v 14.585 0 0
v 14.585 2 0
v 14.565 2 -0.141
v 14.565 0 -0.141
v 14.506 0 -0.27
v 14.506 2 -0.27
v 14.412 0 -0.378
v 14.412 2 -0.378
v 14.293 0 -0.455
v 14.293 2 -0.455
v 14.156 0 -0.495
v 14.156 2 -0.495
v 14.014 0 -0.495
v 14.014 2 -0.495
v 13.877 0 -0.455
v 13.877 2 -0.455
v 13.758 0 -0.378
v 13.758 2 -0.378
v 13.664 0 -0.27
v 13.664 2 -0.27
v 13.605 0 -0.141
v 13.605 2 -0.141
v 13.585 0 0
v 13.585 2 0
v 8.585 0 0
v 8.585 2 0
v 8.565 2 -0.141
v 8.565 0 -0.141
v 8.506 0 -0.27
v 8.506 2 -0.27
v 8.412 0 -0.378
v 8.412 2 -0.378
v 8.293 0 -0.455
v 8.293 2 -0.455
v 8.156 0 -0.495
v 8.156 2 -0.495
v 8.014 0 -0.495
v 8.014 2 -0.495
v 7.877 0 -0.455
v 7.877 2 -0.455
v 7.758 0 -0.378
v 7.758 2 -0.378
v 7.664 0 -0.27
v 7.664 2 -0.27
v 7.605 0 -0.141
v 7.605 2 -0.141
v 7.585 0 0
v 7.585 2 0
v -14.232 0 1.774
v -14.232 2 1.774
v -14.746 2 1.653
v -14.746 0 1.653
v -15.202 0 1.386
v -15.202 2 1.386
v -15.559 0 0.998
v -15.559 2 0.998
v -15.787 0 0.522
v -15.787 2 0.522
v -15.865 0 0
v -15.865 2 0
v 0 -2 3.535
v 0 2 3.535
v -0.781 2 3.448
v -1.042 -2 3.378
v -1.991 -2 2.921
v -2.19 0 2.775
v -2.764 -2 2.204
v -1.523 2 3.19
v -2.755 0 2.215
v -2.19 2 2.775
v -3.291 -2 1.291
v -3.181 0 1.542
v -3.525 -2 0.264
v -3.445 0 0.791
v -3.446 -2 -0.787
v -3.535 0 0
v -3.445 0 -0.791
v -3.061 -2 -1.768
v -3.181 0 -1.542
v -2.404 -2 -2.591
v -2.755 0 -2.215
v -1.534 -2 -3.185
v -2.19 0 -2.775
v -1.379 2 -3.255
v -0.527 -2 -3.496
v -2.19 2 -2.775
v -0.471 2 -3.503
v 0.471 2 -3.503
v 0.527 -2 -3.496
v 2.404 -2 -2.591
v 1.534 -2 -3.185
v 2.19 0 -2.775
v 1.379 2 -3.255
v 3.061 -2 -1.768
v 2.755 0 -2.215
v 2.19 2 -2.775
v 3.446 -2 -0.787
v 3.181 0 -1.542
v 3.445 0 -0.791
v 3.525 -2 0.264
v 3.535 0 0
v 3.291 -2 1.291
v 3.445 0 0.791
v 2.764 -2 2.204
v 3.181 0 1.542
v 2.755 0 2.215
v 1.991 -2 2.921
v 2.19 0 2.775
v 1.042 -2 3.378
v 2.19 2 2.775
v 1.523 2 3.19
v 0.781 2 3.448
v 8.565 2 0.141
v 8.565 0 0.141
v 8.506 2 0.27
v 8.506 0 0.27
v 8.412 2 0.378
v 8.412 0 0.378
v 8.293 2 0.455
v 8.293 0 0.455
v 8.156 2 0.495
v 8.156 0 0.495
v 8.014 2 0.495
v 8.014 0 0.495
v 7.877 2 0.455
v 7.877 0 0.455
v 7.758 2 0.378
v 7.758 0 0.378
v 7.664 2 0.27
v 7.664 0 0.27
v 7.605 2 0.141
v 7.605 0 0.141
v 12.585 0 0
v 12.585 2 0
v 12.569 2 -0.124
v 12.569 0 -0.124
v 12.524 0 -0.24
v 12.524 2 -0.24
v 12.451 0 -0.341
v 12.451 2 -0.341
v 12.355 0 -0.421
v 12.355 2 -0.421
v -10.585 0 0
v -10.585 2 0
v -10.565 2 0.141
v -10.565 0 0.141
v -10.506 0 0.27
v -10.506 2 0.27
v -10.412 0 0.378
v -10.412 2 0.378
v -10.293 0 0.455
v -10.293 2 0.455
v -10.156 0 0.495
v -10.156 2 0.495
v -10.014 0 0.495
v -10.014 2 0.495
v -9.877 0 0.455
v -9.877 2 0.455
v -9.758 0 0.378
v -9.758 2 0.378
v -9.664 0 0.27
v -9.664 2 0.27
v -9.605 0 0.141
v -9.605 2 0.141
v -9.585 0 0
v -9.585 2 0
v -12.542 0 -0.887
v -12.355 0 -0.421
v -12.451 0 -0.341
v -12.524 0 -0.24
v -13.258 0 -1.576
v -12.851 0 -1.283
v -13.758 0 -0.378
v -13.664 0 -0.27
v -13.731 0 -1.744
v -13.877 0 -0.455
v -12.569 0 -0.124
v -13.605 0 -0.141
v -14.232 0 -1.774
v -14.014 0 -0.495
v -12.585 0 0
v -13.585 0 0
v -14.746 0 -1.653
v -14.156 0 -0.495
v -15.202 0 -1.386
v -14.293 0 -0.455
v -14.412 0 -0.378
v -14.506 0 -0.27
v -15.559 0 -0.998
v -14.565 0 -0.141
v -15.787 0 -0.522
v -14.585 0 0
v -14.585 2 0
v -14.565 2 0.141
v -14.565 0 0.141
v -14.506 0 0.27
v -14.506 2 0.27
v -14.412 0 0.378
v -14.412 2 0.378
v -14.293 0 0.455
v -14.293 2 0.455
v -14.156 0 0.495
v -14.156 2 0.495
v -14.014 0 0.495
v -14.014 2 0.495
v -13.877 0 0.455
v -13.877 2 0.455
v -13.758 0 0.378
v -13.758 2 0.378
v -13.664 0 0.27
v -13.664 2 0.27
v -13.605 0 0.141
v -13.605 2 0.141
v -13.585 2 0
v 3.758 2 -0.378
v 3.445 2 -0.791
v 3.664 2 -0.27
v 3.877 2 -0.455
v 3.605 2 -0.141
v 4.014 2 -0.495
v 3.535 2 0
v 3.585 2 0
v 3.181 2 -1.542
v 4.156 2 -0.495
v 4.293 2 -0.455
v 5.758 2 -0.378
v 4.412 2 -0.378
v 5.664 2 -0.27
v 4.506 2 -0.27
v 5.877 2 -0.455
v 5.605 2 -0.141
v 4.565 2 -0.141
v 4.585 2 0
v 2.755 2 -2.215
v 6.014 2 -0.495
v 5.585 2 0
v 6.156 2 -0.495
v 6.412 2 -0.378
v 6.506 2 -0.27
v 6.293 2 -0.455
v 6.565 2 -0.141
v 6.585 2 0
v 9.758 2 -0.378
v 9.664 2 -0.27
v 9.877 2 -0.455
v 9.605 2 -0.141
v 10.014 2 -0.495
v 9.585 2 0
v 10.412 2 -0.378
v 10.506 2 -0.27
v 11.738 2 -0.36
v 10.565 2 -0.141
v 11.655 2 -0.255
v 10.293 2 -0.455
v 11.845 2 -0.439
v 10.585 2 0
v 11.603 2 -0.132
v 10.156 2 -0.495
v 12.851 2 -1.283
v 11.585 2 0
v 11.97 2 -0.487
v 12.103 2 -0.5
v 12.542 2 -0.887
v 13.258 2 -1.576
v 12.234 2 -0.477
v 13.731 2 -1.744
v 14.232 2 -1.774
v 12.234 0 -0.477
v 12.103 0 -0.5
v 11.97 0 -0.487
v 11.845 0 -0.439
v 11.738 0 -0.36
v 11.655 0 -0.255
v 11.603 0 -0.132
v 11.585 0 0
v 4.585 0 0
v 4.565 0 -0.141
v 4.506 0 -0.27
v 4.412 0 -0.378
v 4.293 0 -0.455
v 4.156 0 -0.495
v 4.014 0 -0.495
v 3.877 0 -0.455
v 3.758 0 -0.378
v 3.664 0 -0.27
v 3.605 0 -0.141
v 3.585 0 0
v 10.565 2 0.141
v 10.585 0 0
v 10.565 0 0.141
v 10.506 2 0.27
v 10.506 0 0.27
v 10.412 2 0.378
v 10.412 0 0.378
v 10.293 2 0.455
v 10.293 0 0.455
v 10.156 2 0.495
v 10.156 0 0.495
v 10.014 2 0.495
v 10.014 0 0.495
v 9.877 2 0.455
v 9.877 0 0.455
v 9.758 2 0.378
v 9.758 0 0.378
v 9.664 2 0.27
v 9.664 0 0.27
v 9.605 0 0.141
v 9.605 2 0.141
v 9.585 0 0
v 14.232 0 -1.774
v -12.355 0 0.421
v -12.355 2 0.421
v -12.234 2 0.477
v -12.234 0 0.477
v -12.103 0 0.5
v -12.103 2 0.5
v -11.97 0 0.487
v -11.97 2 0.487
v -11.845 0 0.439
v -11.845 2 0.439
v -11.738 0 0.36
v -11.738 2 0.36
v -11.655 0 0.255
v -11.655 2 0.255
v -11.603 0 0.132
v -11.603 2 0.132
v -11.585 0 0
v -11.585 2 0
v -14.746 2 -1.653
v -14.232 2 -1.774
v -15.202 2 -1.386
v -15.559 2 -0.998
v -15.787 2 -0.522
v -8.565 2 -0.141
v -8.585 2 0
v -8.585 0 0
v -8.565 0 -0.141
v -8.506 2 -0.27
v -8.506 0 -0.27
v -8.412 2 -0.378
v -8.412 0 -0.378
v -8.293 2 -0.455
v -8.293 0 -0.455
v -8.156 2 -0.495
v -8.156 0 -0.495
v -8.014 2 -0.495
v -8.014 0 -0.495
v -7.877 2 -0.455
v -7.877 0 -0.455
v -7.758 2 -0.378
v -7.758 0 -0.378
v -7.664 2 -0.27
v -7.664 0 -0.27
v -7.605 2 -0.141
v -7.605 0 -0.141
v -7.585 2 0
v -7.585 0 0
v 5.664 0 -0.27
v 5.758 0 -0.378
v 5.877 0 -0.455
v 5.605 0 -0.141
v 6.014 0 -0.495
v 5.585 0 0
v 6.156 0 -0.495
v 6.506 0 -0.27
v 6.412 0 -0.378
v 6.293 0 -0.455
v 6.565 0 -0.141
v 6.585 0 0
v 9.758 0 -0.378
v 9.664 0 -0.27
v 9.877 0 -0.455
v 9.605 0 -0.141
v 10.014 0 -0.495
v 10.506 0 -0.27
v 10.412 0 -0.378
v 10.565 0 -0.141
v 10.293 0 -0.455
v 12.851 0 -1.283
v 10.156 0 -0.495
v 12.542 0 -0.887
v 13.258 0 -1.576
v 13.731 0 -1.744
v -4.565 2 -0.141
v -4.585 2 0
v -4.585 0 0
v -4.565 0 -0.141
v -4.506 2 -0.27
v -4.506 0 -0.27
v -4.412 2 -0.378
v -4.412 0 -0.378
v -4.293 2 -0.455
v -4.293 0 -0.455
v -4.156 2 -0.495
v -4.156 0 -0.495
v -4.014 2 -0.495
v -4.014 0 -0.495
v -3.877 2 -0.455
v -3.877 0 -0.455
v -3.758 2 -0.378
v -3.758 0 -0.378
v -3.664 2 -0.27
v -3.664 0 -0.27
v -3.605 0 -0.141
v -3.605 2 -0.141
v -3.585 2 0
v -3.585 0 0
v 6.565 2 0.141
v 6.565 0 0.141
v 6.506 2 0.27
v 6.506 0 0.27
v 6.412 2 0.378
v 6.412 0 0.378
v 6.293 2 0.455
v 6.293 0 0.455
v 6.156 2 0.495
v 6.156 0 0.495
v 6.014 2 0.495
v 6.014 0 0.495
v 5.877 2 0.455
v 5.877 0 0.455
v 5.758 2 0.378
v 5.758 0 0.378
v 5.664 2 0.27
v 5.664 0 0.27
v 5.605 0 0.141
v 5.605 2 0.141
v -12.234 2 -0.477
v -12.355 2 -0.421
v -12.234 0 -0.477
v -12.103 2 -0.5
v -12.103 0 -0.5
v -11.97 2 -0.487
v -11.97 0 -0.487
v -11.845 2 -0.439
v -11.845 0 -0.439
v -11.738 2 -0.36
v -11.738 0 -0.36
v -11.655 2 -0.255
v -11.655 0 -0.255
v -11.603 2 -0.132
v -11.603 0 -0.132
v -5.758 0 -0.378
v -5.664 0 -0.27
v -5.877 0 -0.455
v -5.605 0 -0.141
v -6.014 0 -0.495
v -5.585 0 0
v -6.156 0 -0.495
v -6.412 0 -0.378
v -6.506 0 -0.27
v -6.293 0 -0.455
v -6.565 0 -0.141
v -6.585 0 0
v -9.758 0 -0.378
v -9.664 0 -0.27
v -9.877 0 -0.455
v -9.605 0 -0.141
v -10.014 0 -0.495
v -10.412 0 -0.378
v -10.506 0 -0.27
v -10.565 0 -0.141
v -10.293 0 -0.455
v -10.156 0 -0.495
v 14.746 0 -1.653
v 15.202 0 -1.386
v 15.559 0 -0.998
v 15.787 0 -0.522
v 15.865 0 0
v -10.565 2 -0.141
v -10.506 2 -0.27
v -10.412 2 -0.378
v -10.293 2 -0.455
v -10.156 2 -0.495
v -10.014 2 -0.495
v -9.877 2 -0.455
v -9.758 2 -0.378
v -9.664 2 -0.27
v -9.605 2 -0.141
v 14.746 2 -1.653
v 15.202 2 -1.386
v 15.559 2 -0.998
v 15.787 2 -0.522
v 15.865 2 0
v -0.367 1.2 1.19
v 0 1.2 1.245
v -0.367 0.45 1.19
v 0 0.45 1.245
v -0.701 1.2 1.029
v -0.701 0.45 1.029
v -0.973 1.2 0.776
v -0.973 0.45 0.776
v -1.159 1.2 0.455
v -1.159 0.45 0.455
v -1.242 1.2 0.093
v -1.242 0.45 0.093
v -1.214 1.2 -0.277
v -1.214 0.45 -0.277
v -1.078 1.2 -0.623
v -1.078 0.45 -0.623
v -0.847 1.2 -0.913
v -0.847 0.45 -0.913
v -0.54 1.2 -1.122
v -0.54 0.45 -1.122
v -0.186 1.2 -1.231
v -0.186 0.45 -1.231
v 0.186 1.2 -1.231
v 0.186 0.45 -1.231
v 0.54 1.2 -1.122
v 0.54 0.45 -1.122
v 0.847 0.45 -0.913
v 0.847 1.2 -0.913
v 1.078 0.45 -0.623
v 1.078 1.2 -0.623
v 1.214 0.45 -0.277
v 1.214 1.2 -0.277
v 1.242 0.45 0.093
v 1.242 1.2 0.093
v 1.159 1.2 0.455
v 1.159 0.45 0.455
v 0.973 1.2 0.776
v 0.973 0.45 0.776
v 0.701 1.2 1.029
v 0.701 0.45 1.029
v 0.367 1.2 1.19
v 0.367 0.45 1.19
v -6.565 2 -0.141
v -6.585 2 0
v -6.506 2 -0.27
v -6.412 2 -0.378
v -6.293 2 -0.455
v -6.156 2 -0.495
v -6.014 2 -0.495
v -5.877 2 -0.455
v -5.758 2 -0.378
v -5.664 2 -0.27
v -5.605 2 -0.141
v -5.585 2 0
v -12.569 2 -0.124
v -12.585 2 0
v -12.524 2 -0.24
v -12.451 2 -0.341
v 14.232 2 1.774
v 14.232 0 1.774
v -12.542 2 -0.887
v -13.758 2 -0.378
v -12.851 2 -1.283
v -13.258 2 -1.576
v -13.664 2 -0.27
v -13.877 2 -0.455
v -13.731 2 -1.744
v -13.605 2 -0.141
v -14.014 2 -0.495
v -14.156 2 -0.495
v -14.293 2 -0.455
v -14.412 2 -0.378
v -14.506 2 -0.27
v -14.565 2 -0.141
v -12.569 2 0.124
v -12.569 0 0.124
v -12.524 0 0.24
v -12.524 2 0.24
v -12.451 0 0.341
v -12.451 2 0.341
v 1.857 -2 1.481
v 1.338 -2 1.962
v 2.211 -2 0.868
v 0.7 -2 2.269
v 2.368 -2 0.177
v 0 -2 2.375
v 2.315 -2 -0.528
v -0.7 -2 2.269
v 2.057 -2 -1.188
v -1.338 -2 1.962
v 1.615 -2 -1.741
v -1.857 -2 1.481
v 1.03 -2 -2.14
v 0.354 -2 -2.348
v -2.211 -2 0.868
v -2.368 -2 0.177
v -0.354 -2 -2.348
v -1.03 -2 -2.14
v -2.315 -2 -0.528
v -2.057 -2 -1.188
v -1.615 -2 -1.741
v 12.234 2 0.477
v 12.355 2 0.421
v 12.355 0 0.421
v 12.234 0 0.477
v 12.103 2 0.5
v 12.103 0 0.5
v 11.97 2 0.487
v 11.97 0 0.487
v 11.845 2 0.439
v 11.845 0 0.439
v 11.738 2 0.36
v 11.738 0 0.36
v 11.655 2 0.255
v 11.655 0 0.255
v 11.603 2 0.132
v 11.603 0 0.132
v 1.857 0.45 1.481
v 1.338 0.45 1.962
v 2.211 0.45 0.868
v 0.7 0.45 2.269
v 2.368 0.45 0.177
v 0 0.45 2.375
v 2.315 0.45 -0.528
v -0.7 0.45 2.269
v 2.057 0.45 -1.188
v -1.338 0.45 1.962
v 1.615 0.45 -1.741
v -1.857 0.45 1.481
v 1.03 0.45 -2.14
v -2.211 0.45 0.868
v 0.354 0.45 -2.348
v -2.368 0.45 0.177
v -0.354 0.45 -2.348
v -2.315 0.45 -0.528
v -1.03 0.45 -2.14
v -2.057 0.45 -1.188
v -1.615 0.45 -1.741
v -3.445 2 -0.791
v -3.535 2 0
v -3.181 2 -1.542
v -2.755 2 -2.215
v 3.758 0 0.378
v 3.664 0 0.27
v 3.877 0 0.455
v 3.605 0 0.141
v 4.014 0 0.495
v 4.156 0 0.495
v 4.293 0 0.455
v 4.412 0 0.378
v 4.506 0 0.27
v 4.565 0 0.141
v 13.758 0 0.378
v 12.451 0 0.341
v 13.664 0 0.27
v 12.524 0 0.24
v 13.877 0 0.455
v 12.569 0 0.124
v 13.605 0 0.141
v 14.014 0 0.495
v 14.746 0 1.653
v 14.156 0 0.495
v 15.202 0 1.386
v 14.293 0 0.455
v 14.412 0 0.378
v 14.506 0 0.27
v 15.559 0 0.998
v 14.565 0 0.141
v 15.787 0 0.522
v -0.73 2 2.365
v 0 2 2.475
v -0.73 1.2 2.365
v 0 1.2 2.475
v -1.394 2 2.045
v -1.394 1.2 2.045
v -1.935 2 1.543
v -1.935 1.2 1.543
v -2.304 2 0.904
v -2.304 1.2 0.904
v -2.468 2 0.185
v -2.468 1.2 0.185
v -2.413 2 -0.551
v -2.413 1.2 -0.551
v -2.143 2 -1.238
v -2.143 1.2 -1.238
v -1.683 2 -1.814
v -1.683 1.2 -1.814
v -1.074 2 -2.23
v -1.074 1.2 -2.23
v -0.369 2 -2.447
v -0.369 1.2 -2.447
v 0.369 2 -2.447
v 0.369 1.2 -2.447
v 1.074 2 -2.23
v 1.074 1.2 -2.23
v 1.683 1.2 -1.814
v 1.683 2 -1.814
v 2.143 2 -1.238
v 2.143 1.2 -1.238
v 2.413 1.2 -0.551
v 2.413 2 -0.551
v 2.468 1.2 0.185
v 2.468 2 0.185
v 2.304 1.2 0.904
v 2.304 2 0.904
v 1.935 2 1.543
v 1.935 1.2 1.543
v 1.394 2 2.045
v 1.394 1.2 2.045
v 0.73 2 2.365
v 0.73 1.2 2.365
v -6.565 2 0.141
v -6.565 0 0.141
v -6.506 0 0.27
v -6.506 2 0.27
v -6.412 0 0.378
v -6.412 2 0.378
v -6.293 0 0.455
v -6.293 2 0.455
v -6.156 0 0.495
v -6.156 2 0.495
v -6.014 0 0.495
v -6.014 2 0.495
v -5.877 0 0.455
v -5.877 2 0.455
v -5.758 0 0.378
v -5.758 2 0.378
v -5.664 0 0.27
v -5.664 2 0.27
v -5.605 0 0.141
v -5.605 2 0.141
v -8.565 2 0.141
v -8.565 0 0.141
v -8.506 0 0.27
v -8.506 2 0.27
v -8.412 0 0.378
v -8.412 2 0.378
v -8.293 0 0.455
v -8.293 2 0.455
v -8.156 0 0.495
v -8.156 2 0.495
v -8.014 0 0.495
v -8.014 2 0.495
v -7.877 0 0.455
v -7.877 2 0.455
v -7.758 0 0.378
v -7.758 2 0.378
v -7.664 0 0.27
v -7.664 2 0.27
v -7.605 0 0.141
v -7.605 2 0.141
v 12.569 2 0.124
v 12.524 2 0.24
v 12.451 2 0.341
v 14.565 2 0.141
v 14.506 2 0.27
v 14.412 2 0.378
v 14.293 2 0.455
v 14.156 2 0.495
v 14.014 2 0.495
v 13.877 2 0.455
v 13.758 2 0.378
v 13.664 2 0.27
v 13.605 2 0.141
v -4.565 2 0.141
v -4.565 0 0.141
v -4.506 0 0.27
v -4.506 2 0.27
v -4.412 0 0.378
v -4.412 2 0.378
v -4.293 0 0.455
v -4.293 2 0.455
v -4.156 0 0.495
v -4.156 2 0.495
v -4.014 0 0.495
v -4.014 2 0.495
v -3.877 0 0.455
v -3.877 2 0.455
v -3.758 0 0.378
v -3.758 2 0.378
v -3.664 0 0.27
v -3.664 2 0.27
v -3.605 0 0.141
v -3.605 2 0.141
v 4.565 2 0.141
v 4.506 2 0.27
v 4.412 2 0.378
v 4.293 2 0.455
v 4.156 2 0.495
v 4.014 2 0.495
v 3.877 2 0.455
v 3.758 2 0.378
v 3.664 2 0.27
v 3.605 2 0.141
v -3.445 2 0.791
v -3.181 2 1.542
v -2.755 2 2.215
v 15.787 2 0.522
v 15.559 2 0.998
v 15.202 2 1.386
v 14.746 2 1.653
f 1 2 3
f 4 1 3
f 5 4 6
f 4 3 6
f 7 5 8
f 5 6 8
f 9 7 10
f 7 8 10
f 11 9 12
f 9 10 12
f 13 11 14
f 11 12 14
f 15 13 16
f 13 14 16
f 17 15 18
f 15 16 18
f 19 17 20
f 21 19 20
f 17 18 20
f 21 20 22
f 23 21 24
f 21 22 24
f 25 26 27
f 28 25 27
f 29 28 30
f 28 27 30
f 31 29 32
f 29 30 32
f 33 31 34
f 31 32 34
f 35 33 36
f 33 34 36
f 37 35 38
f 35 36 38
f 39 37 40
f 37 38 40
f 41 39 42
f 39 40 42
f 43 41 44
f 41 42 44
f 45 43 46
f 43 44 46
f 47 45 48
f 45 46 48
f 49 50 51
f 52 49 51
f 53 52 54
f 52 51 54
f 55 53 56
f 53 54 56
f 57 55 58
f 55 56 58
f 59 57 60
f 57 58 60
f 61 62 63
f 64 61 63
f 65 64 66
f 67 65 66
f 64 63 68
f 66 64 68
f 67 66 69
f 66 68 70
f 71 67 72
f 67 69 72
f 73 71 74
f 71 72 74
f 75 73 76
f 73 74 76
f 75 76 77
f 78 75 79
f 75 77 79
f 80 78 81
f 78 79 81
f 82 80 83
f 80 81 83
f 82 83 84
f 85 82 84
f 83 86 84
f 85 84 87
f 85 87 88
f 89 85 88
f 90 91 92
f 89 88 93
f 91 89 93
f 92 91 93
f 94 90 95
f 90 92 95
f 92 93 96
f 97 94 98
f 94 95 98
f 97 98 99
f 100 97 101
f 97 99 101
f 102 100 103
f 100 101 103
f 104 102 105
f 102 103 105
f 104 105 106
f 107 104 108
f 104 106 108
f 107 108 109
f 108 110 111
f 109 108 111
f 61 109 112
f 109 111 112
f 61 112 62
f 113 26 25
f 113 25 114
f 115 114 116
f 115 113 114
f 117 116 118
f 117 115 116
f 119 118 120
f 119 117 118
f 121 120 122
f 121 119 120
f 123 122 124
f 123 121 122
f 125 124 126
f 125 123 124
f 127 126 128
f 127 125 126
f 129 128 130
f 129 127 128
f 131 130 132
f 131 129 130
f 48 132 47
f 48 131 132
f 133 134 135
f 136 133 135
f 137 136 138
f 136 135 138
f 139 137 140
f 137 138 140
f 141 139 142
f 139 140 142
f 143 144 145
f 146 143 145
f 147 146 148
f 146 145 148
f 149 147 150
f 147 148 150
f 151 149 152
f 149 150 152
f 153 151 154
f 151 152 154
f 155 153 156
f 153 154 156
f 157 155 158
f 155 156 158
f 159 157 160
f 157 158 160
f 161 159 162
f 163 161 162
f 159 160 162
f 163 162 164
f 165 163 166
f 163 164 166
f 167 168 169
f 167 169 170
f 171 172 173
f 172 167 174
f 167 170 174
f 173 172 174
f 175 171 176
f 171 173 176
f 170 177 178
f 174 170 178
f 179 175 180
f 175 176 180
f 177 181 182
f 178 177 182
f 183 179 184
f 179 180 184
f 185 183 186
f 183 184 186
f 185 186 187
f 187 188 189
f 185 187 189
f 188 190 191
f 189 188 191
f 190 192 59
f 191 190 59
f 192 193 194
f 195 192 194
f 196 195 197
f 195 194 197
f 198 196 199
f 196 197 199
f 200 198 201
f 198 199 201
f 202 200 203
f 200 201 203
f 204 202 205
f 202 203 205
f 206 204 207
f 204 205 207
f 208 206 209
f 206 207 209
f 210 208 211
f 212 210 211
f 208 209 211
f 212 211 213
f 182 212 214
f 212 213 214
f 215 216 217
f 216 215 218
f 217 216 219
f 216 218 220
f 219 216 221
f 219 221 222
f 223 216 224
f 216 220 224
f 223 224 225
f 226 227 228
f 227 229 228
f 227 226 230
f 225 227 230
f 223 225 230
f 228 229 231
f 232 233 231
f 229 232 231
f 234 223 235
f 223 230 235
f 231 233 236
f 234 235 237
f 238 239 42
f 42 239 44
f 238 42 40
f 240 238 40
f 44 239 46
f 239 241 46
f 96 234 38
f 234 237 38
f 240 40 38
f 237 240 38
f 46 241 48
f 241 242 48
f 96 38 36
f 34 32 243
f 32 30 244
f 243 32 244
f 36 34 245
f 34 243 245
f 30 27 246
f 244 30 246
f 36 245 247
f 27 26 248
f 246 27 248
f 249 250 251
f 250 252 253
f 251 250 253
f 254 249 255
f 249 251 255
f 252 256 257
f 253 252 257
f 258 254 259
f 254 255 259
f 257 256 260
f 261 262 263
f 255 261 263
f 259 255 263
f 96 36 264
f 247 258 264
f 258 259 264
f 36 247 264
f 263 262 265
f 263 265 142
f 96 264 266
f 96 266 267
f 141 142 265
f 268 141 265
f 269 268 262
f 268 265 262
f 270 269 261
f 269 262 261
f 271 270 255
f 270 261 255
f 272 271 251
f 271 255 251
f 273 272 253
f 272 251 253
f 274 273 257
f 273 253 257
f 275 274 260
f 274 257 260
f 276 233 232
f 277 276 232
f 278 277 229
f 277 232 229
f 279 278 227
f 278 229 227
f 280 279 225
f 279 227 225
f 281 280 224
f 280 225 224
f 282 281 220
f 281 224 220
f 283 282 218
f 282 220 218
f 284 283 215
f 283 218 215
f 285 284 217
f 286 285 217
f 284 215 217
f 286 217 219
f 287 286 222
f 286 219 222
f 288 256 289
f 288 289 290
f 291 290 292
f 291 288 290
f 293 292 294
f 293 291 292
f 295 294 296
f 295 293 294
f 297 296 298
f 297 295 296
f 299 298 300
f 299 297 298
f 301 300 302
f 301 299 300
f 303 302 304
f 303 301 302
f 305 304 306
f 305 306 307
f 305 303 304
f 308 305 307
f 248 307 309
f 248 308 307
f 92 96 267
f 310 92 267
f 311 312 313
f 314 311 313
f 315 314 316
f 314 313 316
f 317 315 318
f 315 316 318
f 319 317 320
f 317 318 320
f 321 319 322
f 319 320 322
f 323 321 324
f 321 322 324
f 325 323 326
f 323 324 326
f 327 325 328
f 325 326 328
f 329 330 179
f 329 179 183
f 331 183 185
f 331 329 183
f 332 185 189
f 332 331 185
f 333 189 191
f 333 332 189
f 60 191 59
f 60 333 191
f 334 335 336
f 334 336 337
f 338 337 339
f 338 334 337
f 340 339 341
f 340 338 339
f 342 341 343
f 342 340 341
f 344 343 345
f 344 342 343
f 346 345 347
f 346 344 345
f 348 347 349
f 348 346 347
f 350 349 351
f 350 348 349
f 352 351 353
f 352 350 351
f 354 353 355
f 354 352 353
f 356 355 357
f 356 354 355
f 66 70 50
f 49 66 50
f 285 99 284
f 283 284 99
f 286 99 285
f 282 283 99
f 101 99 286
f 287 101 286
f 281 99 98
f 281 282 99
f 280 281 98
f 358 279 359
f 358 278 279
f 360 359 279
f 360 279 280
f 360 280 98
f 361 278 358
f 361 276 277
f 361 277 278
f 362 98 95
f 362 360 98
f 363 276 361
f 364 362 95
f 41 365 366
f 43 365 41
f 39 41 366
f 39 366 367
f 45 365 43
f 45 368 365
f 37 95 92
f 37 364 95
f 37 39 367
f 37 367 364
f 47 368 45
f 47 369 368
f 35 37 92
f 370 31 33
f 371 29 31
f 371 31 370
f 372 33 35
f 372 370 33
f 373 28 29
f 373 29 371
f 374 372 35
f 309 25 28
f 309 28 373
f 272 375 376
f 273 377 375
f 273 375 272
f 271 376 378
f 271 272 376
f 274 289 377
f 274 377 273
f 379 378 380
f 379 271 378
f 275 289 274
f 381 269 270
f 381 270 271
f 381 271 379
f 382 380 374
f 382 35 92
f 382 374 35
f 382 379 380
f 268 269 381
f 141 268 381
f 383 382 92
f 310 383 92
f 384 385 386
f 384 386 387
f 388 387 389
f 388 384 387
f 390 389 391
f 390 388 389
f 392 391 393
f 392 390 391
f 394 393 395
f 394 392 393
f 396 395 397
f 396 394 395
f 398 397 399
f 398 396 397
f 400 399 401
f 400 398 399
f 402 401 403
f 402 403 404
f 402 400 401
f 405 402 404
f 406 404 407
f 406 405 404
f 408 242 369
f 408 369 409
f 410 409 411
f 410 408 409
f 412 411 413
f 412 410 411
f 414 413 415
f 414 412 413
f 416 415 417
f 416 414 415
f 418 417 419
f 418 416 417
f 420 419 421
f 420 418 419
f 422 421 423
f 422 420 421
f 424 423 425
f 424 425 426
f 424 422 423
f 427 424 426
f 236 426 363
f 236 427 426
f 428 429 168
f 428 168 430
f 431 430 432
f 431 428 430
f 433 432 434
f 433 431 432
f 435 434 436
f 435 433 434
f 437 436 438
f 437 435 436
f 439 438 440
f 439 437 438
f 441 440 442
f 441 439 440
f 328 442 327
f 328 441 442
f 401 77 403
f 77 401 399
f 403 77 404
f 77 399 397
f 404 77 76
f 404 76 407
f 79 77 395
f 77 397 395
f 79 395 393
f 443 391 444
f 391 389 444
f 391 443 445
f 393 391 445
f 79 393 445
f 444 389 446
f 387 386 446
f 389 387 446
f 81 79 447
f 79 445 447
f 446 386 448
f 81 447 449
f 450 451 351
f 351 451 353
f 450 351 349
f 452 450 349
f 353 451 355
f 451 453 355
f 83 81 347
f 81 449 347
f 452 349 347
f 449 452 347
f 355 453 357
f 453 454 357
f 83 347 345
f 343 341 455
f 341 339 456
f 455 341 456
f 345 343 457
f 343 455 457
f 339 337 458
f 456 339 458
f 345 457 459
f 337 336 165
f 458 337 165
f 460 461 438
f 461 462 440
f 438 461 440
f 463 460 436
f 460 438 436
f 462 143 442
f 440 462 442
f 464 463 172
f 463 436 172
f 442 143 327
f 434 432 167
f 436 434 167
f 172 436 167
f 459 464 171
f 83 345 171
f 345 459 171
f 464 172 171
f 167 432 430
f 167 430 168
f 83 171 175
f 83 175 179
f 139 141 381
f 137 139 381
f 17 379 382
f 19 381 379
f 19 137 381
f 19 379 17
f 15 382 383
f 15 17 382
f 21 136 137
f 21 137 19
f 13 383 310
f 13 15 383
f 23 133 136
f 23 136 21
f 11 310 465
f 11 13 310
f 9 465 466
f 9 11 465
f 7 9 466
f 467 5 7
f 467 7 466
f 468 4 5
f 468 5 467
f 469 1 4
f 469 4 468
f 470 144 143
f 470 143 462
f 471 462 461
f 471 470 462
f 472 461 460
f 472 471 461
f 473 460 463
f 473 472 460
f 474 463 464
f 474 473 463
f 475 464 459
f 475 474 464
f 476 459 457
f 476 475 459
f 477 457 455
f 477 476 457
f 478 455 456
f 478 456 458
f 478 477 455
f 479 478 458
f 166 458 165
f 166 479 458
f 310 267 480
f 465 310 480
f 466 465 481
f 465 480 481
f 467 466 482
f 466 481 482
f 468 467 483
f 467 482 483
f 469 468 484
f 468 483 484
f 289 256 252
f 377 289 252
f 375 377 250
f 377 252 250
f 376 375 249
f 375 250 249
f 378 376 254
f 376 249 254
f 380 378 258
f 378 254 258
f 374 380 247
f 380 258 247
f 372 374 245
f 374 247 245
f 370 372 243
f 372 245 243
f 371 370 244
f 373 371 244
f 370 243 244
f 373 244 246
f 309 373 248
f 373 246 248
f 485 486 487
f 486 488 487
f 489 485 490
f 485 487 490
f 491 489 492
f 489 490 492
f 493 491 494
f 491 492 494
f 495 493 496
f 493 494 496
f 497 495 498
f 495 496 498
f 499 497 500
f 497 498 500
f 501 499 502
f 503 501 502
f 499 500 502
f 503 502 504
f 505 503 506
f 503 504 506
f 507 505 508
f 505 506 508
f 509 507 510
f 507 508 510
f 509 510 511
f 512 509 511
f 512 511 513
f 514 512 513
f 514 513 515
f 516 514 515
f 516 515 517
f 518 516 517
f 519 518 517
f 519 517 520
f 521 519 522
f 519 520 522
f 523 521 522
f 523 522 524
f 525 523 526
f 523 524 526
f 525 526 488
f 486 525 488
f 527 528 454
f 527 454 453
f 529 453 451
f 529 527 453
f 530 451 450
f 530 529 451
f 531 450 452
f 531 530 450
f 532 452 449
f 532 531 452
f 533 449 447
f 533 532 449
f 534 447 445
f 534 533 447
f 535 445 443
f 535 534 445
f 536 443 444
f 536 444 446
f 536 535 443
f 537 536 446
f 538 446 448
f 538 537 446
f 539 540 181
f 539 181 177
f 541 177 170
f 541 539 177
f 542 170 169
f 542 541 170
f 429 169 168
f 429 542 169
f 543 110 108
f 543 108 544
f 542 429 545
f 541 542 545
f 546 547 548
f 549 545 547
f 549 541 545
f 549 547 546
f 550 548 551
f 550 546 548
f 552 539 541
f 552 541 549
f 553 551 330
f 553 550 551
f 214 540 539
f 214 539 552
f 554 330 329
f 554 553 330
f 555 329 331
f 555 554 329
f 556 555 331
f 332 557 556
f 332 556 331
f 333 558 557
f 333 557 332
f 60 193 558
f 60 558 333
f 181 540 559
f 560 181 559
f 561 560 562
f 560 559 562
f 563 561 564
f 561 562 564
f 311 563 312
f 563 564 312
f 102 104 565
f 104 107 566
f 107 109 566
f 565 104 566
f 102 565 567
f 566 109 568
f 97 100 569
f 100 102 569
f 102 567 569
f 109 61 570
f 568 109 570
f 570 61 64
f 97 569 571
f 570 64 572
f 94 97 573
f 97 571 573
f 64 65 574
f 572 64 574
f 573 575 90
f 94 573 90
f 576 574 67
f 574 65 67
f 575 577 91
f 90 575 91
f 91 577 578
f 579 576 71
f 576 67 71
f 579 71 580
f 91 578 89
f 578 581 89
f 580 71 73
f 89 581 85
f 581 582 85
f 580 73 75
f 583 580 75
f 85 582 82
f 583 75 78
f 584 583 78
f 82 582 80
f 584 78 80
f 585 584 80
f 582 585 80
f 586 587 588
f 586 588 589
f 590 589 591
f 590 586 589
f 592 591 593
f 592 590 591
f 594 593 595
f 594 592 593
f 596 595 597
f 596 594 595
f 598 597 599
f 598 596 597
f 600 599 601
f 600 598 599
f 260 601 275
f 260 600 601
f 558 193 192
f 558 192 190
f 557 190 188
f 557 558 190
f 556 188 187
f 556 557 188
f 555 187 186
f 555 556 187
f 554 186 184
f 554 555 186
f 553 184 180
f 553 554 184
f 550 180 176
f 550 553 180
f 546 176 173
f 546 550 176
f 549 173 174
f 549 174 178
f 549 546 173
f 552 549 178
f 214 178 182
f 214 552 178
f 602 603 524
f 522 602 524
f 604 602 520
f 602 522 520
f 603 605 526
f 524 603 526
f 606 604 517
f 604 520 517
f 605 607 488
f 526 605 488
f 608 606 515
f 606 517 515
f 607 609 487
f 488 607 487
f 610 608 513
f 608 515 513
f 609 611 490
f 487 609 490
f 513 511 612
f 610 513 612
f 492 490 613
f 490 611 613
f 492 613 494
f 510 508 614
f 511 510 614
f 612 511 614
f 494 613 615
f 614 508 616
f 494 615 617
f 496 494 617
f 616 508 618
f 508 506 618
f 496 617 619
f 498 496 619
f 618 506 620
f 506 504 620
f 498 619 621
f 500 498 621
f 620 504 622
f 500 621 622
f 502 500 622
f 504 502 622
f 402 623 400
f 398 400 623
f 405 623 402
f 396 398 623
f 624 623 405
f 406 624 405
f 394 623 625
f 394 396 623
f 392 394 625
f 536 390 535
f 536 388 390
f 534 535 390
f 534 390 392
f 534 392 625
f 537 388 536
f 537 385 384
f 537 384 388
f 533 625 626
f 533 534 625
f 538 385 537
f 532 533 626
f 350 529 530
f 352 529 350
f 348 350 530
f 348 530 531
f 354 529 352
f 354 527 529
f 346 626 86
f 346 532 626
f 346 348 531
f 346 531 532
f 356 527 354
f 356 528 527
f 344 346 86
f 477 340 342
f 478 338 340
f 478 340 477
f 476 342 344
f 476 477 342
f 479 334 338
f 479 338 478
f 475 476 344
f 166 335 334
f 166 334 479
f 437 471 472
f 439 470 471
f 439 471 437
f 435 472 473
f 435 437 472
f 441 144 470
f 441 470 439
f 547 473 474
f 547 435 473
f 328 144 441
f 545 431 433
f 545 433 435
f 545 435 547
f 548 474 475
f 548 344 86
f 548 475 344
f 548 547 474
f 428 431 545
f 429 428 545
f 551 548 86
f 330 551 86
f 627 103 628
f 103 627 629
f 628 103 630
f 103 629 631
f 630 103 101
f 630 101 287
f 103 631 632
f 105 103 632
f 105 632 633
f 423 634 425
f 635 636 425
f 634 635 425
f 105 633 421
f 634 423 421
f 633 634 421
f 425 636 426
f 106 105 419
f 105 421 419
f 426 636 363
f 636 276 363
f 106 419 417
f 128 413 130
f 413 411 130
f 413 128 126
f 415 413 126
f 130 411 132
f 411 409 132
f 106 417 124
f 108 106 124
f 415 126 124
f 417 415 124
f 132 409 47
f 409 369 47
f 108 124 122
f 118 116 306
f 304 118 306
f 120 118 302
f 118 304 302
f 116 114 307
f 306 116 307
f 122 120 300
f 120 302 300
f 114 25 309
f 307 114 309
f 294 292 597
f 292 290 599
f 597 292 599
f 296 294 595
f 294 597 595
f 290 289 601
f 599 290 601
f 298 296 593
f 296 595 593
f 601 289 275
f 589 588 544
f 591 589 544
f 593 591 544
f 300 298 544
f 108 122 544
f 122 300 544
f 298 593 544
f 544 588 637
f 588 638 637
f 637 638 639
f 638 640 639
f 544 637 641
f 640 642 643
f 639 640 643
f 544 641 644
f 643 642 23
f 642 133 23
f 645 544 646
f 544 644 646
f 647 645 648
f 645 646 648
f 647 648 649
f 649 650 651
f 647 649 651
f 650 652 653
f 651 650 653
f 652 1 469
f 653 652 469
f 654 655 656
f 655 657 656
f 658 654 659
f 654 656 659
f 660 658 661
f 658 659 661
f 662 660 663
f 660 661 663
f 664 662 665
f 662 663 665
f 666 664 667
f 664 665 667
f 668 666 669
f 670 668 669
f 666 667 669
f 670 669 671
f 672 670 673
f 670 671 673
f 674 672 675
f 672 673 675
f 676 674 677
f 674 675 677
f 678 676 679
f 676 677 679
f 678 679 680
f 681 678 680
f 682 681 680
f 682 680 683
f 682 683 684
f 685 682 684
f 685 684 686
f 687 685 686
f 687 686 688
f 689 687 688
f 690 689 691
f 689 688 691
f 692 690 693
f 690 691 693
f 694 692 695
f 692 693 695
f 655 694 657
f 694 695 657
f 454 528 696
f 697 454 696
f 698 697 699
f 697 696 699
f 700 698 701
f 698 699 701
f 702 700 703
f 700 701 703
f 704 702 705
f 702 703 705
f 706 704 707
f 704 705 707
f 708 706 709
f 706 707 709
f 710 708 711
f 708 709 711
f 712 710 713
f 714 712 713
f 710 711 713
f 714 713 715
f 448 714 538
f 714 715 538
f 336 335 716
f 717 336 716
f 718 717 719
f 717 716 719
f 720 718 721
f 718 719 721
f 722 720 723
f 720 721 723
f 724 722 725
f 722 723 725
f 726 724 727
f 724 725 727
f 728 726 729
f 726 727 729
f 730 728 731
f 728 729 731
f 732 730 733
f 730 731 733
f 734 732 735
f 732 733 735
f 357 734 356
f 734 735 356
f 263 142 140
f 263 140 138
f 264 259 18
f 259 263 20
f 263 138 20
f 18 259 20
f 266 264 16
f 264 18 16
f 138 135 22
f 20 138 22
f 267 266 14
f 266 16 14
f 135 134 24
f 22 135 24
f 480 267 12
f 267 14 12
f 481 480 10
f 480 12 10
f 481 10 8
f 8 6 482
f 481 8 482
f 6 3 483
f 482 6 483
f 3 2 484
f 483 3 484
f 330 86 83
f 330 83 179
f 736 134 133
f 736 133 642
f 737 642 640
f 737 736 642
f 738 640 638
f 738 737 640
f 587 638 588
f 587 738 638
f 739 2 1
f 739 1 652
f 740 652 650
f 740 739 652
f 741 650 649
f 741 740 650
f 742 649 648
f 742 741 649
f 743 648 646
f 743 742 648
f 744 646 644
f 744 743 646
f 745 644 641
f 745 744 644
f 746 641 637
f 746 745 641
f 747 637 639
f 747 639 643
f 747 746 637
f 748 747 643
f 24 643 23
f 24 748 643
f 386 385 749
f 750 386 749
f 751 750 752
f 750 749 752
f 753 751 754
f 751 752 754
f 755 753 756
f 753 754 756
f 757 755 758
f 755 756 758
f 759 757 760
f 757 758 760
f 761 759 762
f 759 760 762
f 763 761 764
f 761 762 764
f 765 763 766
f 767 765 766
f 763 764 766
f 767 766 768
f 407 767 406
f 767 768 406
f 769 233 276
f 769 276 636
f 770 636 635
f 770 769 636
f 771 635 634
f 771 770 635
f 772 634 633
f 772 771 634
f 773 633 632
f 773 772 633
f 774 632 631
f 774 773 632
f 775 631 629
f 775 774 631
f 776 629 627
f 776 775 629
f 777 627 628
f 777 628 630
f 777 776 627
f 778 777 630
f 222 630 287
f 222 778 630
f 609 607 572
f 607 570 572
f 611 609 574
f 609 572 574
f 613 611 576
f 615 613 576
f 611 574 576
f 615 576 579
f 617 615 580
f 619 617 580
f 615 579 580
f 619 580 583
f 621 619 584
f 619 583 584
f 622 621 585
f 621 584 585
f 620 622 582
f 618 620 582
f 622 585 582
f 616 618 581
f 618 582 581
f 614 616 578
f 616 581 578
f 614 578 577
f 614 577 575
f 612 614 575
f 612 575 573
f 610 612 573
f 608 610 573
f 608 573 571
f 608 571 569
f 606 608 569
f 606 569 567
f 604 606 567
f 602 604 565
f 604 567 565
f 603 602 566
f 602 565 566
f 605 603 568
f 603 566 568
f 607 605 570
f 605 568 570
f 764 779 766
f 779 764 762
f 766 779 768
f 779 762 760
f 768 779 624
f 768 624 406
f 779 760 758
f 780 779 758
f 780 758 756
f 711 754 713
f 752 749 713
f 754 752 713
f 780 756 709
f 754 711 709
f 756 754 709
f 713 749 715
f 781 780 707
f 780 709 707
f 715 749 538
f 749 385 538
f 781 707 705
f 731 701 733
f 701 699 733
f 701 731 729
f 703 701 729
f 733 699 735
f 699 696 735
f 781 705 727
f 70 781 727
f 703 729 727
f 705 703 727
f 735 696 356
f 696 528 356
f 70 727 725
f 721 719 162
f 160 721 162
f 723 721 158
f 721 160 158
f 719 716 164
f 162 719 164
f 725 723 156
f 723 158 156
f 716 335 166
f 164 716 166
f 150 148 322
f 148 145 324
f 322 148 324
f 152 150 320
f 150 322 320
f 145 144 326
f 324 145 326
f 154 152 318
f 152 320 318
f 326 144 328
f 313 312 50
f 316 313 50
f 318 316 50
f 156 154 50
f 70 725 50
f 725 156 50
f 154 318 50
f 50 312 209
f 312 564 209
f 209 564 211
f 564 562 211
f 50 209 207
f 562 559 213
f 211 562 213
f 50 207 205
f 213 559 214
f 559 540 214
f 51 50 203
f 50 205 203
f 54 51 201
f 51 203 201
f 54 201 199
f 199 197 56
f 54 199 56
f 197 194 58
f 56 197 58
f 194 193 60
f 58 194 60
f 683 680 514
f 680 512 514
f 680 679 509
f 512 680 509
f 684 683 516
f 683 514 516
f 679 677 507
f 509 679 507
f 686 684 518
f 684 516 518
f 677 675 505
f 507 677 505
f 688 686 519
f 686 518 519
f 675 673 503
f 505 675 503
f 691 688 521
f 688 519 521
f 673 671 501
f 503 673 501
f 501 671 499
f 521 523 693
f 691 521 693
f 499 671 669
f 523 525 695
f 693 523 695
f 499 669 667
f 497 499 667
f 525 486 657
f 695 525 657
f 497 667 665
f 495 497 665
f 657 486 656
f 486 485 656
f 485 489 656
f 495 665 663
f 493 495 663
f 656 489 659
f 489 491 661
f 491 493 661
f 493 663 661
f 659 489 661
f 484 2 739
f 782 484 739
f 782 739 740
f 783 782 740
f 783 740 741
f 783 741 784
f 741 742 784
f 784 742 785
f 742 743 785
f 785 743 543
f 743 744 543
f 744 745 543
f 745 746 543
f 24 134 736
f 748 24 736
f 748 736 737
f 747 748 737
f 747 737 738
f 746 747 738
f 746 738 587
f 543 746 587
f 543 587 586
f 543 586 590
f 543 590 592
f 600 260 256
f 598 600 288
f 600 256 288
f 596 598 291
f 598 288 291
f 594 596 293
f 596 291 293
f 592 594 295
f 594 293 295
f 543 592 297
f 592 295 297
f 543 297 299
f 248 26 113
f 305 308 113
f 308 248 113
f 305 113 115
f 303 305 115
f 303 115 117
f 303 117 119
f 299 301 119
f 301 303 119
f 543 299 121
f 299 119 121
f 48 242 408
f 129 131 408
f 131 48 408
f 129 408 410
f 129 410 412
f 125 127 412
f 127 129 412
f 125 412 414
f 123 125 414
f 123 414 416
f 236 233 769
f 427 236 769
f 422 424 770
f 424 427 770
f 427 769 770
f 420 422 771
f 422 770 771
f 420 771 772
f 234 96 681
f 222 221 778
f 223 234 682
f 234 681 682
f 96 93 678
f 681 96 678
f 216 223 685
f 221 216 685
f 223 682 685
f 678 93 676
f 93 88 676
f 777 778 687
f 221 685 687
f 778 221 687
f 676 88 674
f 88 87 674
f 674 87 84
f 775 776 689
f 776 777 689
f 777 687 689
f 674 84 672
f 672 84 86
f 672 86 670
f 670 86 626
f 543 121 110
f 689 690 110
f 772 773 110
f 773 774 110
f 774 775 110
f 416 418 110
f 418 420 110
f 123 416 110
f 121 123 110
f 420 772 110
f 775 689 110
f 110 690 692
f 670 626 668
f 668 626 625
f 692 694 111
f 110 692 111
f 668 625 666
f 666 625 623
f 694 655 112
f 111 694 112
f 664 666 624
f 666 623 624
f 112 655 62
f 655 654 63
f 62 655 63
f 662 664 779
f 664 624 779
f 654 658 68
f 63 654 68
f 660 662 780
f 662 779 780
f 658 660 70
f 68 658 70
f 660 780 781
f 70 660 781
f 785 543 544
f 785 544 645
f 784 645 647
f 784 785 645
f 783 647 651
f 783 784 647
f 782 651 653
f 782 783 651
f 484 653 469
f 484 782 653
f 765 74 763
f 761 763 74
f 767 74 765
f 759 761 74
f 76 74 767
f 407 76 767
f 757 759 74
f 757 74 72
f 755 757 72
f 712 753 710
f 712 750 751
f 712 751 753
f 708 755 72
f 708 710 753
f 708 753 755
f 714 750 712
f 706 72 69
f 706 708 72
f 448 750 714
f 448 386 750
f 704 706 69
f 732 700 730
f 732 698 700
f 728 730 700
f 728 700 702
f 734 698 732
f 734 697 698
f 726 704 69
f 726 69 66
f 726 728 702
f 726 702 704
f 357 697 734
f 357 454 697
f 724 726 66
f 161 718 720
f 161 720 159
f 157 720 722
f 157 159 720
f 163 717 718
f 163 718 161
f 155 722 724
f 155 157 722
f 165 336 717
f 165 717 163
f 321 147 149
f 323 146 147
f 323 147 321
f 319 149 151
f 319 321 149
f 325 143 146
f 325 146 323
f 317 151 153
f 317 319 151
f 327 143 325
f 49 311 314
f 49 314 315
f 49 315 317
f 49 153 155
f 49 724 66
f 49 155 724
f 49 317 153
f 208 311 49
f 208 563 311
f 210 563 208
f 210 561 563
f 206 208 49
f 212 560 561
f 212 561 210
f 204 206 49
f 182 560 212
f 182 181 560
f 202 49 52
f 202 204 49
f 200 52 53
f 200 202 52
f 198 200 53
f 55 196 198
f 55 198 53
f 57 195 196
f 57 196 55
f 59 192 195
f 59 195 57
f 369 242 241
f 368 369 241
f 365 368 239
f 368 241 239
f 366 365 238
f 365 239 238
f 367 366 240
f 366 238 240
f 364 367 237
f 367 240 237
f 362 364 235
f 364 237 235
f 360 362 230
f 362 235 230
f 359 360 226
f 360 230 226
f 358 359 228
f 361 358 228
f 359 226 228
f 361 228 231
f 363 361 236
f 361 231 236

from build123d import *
from build123d.topology import SkipClean

# Parameters (mm, degrees)
BOSS_EXTRUDE1_START   = 2
BOSS_EXTRUDE1_DEPTH   = 2
MIRROR_START          = 2
MIRROR_2_COPY_1_DEPTH = 2
MIRROR_2_COPY_2_DEPTH = 2


with BuildPart() as part:
    # Sketch2 → Revolve1 (revolve)
    with BuildSketch(Plane.XY, mode=Mode.PRIVATE) as revolve1_sk:
        Polygon((2.475, 2), (2.475, 1.2), (1.245, 1.2), (1.245, 0.45), (2.375, 0.45), (2.375, -2), (3.535, -2), (3.535, 2), align=None)
    revolve(revolve1_sk.sketch.rotate(Axis((0, 55, 0), (0, -1, 0)), 90), axis=Axis((0, 55, 0), (0, -1, 0)))

    # Sketch3 → Boss-Extrude1 (add)
    with BuildSketch(Plane(origin=(0, 0, 0), x_dir=(1, 0, 0), z_dir=(0, 1, 0)).offset(BOSS_EXTRUDE1_START)):
        with BuildLine():
            ThreePointArc((3.535, 0), (3.180996027, -1.541910917), (2.189885842, -2.775))
            Line((2.189885842, -2.775), (14.232465575, -1.773881029))
            ThreePointArc((14.232465575, -1.773881029), (13.044016702, -1.443867644), (12.3554, -0.420575606))
            ThreePointArc((12.3554, -0.420575606), (11.845417029, -0.438862165), (11.585, 0))
            Line((11.585, 0), (10.585, 0))
            ThreePointArc((10.585, 0), (10.085, -0.5), (9.585, 0))
            Line((9.585, 0), (8.585, 0))
            ThreePointArc((8.585, 0), (8.085, -0.5), (7.585, 0))
            Line((7.585, 0), (6.585, 0))
            ThreePointArc((6.585, 0), (6.085, -0.5), (5.585, 0))
            Line((5.585, 0), (4.585, 0))
            ThreePointArc((4.585, 0), (4.085, -0.5), (3.585, 0))
            Line((3.585, 0), (3.535, 0))
        make_face()
        with BuildLine():
            ThreePointArc((12.3554, -0.420575606), (13.044016702, -1.443867644), (14.232465575, -1.773881029))
            ThreePointArc((14.232465575, -1.773881029), (15.394749733, -1.205386095), (15.865, 0))
            Line((15.865, 0), (14.585, 0))
            ThreePointArc((14.585, 0), (14.085, -0.5), (13.585, 0))
            Line((13.585, 0), (12.585, 0))
            ThreePointArc((12.585, 0), (12.523862165, -0.239582971), (12.3554, -0.420575606))
        make_face()
    boss_extrude1 = extrude(amount=-BOSS_EXTRUDE1_DEPTH)

    # Mirror1: Boss-Extrude1 across plane
    with SkipClean():  # the faces are left unmerged after this step: merging them gives an invalid solid
        add(boss_extrude1.mirror(Plane(origin=(0, 15.95383002, 0), x_dir=(1, 0, 0), z_dir=(0, 0, -1))))

    # 镜向1: Boss-Extrude1 across plane
    with SkipClean():  # the faces are left unmerged after this step: merging them gives an invalid solid
        add(boss_extrude1.mirror(Plane(origin=(0, 0, 0), x_dir=(0, 0, 1), z_dir=(1, 0, 0))))

    # 镜向2 copy 1 sketch → 镜向2 copy 1 (add)
    with SkipClean():  # the faces are left unmerged after this step: merging them gives an invalid solid
        with BuildSketch(Plane(origin=(0, 0, 0), x_dir=(-1, 0, 0), z_dir=(0, 1, 0)).offset(MIRROR_START)):
            with BuildLine():
                ThreePointArc((3.535, 0), (3.180996027, -1.541910917), (2.189885842, -2.775))
                Line((2.189885842, -2.775), (14.232465575, -1.773881029))
                ThreePointArc((14.232465575, -1.773881029), (13.044016702, -1.443867644), (12.3554, -0.420575606))
                ThreePointArc((12.3554, -0.420575606), (11.845417029, -0.438862165), (11.585, 0))
                Line((11.585, 0), (10.585, 0))
                ThreePointArc((10.585, 0), (10.085, -0.5), (9.585, 0))
                Line((9.585, 0), (8.585, 0))
                ThreePointArc((8.585, 0), (8.085, -0.5), (7.585, 0))
                Line((7.585, 0), (6.585, 0))
                ThreePointArc((6.585, 0), (6.085, -0.5), (5.585, 0))
                Line((5.585, 0), (4.585, 0))
                ThreePointArc((4.585, 0), (4.085, -0.5), (3.585, 0))
                Line((3.585, 0), (3.535, 0))
            make_face()
            with BuildLine():
                ThreePointArc((12.3554, -0.420575606), (13.044016702, -1.443867644), (14.232465575, -1.773881029))
                ThreePointArc((14.232465575, -1.773881029), (15.394749733, -1.205386095), (15.865, 0))
                Line((15.865, 0), (14.585, 0))
                ThreePointArc((14.585, 0), (14.085, -0.5), (13.585, 0))
                Line((13.585, 0), (12.585, 0))
                ThreePointArc((12.585, 0), (12.523862165, -0.239582971), (12.3554, -0.420575606))
            make_face()
        extrude(amount=-MIRROR_2_COPY_1_DEPTH)

    # 镜向2 copy 2 sketch → 镜向2 copy 2 (add)
    with SkipClean():  # the faces are left unmerged after this step: merging them gives an invalid solid
        with BuildSketch(Plane(origin=(0, 0, 0), x_dir=(1, 0, 0), z_dir=(0, 1, 0)).offset(MIRROR_START)):
            with BuildLine():
                ThreePointArc((3.535, 0), (3.180996027, 1.541910917), (2.189885842, 2.775))
                Line((2.189885842, 2.775), (14.232465575, 1.773881029))
                ThreePointArc((14.232465575, 1.773881029), (13.044016702, 1.443867644), (12.3554, 0.420575606))
                ThreePointArc((12.3554, 0.420575606), (11.845417029, 0.438862165), (11.585, 0))
                Line((11.585, 0), (10.585, 0))
                ThreePointArc((10.585, 0), (10.085, 0.5), (9.585, 0))
                Line((9.585, 0), (8.585, 0))
                ThreePointArc((8.585, 0), (8.085, 0.5), (7.585, 0))
                Line((7.585, 0), (6.585, 0))
                ThreePointArc((6.585, 0), (6.085, 0.5), (5.585, 0))
                Line((5.585, 0), (4.585, 0))
                ThreePointArc((4.585, 0), (4.085, 0.5), (3.585, 0))
                Line((3.585, 0), (3.535, 0))
            make_face()
            with BuildLine():
                ThreePointArc((12.3554, 0.420575606), (13.044016702, 1.443867644), (14.232465575, 1.773881029))
                ThreePointArc((14.232465575, 1.773881029), (15.394749733, 1.205386095), (15.865, 0))
                Line((15.865, 0), (14.585, 0))
                ThreePointArc((14.585, 0), (14.085, 0.5), (13.585, 0))
                Line((13.585, 0), (12.585, 0))
                ThreePointArc((12.585, 0), (12.523862165, 0.239582971), (12.3554, 0.420575606))
            make_face()
        extrude(amount=-MIRROR_2_COPY_2_DEPTH)


solid = part.part
